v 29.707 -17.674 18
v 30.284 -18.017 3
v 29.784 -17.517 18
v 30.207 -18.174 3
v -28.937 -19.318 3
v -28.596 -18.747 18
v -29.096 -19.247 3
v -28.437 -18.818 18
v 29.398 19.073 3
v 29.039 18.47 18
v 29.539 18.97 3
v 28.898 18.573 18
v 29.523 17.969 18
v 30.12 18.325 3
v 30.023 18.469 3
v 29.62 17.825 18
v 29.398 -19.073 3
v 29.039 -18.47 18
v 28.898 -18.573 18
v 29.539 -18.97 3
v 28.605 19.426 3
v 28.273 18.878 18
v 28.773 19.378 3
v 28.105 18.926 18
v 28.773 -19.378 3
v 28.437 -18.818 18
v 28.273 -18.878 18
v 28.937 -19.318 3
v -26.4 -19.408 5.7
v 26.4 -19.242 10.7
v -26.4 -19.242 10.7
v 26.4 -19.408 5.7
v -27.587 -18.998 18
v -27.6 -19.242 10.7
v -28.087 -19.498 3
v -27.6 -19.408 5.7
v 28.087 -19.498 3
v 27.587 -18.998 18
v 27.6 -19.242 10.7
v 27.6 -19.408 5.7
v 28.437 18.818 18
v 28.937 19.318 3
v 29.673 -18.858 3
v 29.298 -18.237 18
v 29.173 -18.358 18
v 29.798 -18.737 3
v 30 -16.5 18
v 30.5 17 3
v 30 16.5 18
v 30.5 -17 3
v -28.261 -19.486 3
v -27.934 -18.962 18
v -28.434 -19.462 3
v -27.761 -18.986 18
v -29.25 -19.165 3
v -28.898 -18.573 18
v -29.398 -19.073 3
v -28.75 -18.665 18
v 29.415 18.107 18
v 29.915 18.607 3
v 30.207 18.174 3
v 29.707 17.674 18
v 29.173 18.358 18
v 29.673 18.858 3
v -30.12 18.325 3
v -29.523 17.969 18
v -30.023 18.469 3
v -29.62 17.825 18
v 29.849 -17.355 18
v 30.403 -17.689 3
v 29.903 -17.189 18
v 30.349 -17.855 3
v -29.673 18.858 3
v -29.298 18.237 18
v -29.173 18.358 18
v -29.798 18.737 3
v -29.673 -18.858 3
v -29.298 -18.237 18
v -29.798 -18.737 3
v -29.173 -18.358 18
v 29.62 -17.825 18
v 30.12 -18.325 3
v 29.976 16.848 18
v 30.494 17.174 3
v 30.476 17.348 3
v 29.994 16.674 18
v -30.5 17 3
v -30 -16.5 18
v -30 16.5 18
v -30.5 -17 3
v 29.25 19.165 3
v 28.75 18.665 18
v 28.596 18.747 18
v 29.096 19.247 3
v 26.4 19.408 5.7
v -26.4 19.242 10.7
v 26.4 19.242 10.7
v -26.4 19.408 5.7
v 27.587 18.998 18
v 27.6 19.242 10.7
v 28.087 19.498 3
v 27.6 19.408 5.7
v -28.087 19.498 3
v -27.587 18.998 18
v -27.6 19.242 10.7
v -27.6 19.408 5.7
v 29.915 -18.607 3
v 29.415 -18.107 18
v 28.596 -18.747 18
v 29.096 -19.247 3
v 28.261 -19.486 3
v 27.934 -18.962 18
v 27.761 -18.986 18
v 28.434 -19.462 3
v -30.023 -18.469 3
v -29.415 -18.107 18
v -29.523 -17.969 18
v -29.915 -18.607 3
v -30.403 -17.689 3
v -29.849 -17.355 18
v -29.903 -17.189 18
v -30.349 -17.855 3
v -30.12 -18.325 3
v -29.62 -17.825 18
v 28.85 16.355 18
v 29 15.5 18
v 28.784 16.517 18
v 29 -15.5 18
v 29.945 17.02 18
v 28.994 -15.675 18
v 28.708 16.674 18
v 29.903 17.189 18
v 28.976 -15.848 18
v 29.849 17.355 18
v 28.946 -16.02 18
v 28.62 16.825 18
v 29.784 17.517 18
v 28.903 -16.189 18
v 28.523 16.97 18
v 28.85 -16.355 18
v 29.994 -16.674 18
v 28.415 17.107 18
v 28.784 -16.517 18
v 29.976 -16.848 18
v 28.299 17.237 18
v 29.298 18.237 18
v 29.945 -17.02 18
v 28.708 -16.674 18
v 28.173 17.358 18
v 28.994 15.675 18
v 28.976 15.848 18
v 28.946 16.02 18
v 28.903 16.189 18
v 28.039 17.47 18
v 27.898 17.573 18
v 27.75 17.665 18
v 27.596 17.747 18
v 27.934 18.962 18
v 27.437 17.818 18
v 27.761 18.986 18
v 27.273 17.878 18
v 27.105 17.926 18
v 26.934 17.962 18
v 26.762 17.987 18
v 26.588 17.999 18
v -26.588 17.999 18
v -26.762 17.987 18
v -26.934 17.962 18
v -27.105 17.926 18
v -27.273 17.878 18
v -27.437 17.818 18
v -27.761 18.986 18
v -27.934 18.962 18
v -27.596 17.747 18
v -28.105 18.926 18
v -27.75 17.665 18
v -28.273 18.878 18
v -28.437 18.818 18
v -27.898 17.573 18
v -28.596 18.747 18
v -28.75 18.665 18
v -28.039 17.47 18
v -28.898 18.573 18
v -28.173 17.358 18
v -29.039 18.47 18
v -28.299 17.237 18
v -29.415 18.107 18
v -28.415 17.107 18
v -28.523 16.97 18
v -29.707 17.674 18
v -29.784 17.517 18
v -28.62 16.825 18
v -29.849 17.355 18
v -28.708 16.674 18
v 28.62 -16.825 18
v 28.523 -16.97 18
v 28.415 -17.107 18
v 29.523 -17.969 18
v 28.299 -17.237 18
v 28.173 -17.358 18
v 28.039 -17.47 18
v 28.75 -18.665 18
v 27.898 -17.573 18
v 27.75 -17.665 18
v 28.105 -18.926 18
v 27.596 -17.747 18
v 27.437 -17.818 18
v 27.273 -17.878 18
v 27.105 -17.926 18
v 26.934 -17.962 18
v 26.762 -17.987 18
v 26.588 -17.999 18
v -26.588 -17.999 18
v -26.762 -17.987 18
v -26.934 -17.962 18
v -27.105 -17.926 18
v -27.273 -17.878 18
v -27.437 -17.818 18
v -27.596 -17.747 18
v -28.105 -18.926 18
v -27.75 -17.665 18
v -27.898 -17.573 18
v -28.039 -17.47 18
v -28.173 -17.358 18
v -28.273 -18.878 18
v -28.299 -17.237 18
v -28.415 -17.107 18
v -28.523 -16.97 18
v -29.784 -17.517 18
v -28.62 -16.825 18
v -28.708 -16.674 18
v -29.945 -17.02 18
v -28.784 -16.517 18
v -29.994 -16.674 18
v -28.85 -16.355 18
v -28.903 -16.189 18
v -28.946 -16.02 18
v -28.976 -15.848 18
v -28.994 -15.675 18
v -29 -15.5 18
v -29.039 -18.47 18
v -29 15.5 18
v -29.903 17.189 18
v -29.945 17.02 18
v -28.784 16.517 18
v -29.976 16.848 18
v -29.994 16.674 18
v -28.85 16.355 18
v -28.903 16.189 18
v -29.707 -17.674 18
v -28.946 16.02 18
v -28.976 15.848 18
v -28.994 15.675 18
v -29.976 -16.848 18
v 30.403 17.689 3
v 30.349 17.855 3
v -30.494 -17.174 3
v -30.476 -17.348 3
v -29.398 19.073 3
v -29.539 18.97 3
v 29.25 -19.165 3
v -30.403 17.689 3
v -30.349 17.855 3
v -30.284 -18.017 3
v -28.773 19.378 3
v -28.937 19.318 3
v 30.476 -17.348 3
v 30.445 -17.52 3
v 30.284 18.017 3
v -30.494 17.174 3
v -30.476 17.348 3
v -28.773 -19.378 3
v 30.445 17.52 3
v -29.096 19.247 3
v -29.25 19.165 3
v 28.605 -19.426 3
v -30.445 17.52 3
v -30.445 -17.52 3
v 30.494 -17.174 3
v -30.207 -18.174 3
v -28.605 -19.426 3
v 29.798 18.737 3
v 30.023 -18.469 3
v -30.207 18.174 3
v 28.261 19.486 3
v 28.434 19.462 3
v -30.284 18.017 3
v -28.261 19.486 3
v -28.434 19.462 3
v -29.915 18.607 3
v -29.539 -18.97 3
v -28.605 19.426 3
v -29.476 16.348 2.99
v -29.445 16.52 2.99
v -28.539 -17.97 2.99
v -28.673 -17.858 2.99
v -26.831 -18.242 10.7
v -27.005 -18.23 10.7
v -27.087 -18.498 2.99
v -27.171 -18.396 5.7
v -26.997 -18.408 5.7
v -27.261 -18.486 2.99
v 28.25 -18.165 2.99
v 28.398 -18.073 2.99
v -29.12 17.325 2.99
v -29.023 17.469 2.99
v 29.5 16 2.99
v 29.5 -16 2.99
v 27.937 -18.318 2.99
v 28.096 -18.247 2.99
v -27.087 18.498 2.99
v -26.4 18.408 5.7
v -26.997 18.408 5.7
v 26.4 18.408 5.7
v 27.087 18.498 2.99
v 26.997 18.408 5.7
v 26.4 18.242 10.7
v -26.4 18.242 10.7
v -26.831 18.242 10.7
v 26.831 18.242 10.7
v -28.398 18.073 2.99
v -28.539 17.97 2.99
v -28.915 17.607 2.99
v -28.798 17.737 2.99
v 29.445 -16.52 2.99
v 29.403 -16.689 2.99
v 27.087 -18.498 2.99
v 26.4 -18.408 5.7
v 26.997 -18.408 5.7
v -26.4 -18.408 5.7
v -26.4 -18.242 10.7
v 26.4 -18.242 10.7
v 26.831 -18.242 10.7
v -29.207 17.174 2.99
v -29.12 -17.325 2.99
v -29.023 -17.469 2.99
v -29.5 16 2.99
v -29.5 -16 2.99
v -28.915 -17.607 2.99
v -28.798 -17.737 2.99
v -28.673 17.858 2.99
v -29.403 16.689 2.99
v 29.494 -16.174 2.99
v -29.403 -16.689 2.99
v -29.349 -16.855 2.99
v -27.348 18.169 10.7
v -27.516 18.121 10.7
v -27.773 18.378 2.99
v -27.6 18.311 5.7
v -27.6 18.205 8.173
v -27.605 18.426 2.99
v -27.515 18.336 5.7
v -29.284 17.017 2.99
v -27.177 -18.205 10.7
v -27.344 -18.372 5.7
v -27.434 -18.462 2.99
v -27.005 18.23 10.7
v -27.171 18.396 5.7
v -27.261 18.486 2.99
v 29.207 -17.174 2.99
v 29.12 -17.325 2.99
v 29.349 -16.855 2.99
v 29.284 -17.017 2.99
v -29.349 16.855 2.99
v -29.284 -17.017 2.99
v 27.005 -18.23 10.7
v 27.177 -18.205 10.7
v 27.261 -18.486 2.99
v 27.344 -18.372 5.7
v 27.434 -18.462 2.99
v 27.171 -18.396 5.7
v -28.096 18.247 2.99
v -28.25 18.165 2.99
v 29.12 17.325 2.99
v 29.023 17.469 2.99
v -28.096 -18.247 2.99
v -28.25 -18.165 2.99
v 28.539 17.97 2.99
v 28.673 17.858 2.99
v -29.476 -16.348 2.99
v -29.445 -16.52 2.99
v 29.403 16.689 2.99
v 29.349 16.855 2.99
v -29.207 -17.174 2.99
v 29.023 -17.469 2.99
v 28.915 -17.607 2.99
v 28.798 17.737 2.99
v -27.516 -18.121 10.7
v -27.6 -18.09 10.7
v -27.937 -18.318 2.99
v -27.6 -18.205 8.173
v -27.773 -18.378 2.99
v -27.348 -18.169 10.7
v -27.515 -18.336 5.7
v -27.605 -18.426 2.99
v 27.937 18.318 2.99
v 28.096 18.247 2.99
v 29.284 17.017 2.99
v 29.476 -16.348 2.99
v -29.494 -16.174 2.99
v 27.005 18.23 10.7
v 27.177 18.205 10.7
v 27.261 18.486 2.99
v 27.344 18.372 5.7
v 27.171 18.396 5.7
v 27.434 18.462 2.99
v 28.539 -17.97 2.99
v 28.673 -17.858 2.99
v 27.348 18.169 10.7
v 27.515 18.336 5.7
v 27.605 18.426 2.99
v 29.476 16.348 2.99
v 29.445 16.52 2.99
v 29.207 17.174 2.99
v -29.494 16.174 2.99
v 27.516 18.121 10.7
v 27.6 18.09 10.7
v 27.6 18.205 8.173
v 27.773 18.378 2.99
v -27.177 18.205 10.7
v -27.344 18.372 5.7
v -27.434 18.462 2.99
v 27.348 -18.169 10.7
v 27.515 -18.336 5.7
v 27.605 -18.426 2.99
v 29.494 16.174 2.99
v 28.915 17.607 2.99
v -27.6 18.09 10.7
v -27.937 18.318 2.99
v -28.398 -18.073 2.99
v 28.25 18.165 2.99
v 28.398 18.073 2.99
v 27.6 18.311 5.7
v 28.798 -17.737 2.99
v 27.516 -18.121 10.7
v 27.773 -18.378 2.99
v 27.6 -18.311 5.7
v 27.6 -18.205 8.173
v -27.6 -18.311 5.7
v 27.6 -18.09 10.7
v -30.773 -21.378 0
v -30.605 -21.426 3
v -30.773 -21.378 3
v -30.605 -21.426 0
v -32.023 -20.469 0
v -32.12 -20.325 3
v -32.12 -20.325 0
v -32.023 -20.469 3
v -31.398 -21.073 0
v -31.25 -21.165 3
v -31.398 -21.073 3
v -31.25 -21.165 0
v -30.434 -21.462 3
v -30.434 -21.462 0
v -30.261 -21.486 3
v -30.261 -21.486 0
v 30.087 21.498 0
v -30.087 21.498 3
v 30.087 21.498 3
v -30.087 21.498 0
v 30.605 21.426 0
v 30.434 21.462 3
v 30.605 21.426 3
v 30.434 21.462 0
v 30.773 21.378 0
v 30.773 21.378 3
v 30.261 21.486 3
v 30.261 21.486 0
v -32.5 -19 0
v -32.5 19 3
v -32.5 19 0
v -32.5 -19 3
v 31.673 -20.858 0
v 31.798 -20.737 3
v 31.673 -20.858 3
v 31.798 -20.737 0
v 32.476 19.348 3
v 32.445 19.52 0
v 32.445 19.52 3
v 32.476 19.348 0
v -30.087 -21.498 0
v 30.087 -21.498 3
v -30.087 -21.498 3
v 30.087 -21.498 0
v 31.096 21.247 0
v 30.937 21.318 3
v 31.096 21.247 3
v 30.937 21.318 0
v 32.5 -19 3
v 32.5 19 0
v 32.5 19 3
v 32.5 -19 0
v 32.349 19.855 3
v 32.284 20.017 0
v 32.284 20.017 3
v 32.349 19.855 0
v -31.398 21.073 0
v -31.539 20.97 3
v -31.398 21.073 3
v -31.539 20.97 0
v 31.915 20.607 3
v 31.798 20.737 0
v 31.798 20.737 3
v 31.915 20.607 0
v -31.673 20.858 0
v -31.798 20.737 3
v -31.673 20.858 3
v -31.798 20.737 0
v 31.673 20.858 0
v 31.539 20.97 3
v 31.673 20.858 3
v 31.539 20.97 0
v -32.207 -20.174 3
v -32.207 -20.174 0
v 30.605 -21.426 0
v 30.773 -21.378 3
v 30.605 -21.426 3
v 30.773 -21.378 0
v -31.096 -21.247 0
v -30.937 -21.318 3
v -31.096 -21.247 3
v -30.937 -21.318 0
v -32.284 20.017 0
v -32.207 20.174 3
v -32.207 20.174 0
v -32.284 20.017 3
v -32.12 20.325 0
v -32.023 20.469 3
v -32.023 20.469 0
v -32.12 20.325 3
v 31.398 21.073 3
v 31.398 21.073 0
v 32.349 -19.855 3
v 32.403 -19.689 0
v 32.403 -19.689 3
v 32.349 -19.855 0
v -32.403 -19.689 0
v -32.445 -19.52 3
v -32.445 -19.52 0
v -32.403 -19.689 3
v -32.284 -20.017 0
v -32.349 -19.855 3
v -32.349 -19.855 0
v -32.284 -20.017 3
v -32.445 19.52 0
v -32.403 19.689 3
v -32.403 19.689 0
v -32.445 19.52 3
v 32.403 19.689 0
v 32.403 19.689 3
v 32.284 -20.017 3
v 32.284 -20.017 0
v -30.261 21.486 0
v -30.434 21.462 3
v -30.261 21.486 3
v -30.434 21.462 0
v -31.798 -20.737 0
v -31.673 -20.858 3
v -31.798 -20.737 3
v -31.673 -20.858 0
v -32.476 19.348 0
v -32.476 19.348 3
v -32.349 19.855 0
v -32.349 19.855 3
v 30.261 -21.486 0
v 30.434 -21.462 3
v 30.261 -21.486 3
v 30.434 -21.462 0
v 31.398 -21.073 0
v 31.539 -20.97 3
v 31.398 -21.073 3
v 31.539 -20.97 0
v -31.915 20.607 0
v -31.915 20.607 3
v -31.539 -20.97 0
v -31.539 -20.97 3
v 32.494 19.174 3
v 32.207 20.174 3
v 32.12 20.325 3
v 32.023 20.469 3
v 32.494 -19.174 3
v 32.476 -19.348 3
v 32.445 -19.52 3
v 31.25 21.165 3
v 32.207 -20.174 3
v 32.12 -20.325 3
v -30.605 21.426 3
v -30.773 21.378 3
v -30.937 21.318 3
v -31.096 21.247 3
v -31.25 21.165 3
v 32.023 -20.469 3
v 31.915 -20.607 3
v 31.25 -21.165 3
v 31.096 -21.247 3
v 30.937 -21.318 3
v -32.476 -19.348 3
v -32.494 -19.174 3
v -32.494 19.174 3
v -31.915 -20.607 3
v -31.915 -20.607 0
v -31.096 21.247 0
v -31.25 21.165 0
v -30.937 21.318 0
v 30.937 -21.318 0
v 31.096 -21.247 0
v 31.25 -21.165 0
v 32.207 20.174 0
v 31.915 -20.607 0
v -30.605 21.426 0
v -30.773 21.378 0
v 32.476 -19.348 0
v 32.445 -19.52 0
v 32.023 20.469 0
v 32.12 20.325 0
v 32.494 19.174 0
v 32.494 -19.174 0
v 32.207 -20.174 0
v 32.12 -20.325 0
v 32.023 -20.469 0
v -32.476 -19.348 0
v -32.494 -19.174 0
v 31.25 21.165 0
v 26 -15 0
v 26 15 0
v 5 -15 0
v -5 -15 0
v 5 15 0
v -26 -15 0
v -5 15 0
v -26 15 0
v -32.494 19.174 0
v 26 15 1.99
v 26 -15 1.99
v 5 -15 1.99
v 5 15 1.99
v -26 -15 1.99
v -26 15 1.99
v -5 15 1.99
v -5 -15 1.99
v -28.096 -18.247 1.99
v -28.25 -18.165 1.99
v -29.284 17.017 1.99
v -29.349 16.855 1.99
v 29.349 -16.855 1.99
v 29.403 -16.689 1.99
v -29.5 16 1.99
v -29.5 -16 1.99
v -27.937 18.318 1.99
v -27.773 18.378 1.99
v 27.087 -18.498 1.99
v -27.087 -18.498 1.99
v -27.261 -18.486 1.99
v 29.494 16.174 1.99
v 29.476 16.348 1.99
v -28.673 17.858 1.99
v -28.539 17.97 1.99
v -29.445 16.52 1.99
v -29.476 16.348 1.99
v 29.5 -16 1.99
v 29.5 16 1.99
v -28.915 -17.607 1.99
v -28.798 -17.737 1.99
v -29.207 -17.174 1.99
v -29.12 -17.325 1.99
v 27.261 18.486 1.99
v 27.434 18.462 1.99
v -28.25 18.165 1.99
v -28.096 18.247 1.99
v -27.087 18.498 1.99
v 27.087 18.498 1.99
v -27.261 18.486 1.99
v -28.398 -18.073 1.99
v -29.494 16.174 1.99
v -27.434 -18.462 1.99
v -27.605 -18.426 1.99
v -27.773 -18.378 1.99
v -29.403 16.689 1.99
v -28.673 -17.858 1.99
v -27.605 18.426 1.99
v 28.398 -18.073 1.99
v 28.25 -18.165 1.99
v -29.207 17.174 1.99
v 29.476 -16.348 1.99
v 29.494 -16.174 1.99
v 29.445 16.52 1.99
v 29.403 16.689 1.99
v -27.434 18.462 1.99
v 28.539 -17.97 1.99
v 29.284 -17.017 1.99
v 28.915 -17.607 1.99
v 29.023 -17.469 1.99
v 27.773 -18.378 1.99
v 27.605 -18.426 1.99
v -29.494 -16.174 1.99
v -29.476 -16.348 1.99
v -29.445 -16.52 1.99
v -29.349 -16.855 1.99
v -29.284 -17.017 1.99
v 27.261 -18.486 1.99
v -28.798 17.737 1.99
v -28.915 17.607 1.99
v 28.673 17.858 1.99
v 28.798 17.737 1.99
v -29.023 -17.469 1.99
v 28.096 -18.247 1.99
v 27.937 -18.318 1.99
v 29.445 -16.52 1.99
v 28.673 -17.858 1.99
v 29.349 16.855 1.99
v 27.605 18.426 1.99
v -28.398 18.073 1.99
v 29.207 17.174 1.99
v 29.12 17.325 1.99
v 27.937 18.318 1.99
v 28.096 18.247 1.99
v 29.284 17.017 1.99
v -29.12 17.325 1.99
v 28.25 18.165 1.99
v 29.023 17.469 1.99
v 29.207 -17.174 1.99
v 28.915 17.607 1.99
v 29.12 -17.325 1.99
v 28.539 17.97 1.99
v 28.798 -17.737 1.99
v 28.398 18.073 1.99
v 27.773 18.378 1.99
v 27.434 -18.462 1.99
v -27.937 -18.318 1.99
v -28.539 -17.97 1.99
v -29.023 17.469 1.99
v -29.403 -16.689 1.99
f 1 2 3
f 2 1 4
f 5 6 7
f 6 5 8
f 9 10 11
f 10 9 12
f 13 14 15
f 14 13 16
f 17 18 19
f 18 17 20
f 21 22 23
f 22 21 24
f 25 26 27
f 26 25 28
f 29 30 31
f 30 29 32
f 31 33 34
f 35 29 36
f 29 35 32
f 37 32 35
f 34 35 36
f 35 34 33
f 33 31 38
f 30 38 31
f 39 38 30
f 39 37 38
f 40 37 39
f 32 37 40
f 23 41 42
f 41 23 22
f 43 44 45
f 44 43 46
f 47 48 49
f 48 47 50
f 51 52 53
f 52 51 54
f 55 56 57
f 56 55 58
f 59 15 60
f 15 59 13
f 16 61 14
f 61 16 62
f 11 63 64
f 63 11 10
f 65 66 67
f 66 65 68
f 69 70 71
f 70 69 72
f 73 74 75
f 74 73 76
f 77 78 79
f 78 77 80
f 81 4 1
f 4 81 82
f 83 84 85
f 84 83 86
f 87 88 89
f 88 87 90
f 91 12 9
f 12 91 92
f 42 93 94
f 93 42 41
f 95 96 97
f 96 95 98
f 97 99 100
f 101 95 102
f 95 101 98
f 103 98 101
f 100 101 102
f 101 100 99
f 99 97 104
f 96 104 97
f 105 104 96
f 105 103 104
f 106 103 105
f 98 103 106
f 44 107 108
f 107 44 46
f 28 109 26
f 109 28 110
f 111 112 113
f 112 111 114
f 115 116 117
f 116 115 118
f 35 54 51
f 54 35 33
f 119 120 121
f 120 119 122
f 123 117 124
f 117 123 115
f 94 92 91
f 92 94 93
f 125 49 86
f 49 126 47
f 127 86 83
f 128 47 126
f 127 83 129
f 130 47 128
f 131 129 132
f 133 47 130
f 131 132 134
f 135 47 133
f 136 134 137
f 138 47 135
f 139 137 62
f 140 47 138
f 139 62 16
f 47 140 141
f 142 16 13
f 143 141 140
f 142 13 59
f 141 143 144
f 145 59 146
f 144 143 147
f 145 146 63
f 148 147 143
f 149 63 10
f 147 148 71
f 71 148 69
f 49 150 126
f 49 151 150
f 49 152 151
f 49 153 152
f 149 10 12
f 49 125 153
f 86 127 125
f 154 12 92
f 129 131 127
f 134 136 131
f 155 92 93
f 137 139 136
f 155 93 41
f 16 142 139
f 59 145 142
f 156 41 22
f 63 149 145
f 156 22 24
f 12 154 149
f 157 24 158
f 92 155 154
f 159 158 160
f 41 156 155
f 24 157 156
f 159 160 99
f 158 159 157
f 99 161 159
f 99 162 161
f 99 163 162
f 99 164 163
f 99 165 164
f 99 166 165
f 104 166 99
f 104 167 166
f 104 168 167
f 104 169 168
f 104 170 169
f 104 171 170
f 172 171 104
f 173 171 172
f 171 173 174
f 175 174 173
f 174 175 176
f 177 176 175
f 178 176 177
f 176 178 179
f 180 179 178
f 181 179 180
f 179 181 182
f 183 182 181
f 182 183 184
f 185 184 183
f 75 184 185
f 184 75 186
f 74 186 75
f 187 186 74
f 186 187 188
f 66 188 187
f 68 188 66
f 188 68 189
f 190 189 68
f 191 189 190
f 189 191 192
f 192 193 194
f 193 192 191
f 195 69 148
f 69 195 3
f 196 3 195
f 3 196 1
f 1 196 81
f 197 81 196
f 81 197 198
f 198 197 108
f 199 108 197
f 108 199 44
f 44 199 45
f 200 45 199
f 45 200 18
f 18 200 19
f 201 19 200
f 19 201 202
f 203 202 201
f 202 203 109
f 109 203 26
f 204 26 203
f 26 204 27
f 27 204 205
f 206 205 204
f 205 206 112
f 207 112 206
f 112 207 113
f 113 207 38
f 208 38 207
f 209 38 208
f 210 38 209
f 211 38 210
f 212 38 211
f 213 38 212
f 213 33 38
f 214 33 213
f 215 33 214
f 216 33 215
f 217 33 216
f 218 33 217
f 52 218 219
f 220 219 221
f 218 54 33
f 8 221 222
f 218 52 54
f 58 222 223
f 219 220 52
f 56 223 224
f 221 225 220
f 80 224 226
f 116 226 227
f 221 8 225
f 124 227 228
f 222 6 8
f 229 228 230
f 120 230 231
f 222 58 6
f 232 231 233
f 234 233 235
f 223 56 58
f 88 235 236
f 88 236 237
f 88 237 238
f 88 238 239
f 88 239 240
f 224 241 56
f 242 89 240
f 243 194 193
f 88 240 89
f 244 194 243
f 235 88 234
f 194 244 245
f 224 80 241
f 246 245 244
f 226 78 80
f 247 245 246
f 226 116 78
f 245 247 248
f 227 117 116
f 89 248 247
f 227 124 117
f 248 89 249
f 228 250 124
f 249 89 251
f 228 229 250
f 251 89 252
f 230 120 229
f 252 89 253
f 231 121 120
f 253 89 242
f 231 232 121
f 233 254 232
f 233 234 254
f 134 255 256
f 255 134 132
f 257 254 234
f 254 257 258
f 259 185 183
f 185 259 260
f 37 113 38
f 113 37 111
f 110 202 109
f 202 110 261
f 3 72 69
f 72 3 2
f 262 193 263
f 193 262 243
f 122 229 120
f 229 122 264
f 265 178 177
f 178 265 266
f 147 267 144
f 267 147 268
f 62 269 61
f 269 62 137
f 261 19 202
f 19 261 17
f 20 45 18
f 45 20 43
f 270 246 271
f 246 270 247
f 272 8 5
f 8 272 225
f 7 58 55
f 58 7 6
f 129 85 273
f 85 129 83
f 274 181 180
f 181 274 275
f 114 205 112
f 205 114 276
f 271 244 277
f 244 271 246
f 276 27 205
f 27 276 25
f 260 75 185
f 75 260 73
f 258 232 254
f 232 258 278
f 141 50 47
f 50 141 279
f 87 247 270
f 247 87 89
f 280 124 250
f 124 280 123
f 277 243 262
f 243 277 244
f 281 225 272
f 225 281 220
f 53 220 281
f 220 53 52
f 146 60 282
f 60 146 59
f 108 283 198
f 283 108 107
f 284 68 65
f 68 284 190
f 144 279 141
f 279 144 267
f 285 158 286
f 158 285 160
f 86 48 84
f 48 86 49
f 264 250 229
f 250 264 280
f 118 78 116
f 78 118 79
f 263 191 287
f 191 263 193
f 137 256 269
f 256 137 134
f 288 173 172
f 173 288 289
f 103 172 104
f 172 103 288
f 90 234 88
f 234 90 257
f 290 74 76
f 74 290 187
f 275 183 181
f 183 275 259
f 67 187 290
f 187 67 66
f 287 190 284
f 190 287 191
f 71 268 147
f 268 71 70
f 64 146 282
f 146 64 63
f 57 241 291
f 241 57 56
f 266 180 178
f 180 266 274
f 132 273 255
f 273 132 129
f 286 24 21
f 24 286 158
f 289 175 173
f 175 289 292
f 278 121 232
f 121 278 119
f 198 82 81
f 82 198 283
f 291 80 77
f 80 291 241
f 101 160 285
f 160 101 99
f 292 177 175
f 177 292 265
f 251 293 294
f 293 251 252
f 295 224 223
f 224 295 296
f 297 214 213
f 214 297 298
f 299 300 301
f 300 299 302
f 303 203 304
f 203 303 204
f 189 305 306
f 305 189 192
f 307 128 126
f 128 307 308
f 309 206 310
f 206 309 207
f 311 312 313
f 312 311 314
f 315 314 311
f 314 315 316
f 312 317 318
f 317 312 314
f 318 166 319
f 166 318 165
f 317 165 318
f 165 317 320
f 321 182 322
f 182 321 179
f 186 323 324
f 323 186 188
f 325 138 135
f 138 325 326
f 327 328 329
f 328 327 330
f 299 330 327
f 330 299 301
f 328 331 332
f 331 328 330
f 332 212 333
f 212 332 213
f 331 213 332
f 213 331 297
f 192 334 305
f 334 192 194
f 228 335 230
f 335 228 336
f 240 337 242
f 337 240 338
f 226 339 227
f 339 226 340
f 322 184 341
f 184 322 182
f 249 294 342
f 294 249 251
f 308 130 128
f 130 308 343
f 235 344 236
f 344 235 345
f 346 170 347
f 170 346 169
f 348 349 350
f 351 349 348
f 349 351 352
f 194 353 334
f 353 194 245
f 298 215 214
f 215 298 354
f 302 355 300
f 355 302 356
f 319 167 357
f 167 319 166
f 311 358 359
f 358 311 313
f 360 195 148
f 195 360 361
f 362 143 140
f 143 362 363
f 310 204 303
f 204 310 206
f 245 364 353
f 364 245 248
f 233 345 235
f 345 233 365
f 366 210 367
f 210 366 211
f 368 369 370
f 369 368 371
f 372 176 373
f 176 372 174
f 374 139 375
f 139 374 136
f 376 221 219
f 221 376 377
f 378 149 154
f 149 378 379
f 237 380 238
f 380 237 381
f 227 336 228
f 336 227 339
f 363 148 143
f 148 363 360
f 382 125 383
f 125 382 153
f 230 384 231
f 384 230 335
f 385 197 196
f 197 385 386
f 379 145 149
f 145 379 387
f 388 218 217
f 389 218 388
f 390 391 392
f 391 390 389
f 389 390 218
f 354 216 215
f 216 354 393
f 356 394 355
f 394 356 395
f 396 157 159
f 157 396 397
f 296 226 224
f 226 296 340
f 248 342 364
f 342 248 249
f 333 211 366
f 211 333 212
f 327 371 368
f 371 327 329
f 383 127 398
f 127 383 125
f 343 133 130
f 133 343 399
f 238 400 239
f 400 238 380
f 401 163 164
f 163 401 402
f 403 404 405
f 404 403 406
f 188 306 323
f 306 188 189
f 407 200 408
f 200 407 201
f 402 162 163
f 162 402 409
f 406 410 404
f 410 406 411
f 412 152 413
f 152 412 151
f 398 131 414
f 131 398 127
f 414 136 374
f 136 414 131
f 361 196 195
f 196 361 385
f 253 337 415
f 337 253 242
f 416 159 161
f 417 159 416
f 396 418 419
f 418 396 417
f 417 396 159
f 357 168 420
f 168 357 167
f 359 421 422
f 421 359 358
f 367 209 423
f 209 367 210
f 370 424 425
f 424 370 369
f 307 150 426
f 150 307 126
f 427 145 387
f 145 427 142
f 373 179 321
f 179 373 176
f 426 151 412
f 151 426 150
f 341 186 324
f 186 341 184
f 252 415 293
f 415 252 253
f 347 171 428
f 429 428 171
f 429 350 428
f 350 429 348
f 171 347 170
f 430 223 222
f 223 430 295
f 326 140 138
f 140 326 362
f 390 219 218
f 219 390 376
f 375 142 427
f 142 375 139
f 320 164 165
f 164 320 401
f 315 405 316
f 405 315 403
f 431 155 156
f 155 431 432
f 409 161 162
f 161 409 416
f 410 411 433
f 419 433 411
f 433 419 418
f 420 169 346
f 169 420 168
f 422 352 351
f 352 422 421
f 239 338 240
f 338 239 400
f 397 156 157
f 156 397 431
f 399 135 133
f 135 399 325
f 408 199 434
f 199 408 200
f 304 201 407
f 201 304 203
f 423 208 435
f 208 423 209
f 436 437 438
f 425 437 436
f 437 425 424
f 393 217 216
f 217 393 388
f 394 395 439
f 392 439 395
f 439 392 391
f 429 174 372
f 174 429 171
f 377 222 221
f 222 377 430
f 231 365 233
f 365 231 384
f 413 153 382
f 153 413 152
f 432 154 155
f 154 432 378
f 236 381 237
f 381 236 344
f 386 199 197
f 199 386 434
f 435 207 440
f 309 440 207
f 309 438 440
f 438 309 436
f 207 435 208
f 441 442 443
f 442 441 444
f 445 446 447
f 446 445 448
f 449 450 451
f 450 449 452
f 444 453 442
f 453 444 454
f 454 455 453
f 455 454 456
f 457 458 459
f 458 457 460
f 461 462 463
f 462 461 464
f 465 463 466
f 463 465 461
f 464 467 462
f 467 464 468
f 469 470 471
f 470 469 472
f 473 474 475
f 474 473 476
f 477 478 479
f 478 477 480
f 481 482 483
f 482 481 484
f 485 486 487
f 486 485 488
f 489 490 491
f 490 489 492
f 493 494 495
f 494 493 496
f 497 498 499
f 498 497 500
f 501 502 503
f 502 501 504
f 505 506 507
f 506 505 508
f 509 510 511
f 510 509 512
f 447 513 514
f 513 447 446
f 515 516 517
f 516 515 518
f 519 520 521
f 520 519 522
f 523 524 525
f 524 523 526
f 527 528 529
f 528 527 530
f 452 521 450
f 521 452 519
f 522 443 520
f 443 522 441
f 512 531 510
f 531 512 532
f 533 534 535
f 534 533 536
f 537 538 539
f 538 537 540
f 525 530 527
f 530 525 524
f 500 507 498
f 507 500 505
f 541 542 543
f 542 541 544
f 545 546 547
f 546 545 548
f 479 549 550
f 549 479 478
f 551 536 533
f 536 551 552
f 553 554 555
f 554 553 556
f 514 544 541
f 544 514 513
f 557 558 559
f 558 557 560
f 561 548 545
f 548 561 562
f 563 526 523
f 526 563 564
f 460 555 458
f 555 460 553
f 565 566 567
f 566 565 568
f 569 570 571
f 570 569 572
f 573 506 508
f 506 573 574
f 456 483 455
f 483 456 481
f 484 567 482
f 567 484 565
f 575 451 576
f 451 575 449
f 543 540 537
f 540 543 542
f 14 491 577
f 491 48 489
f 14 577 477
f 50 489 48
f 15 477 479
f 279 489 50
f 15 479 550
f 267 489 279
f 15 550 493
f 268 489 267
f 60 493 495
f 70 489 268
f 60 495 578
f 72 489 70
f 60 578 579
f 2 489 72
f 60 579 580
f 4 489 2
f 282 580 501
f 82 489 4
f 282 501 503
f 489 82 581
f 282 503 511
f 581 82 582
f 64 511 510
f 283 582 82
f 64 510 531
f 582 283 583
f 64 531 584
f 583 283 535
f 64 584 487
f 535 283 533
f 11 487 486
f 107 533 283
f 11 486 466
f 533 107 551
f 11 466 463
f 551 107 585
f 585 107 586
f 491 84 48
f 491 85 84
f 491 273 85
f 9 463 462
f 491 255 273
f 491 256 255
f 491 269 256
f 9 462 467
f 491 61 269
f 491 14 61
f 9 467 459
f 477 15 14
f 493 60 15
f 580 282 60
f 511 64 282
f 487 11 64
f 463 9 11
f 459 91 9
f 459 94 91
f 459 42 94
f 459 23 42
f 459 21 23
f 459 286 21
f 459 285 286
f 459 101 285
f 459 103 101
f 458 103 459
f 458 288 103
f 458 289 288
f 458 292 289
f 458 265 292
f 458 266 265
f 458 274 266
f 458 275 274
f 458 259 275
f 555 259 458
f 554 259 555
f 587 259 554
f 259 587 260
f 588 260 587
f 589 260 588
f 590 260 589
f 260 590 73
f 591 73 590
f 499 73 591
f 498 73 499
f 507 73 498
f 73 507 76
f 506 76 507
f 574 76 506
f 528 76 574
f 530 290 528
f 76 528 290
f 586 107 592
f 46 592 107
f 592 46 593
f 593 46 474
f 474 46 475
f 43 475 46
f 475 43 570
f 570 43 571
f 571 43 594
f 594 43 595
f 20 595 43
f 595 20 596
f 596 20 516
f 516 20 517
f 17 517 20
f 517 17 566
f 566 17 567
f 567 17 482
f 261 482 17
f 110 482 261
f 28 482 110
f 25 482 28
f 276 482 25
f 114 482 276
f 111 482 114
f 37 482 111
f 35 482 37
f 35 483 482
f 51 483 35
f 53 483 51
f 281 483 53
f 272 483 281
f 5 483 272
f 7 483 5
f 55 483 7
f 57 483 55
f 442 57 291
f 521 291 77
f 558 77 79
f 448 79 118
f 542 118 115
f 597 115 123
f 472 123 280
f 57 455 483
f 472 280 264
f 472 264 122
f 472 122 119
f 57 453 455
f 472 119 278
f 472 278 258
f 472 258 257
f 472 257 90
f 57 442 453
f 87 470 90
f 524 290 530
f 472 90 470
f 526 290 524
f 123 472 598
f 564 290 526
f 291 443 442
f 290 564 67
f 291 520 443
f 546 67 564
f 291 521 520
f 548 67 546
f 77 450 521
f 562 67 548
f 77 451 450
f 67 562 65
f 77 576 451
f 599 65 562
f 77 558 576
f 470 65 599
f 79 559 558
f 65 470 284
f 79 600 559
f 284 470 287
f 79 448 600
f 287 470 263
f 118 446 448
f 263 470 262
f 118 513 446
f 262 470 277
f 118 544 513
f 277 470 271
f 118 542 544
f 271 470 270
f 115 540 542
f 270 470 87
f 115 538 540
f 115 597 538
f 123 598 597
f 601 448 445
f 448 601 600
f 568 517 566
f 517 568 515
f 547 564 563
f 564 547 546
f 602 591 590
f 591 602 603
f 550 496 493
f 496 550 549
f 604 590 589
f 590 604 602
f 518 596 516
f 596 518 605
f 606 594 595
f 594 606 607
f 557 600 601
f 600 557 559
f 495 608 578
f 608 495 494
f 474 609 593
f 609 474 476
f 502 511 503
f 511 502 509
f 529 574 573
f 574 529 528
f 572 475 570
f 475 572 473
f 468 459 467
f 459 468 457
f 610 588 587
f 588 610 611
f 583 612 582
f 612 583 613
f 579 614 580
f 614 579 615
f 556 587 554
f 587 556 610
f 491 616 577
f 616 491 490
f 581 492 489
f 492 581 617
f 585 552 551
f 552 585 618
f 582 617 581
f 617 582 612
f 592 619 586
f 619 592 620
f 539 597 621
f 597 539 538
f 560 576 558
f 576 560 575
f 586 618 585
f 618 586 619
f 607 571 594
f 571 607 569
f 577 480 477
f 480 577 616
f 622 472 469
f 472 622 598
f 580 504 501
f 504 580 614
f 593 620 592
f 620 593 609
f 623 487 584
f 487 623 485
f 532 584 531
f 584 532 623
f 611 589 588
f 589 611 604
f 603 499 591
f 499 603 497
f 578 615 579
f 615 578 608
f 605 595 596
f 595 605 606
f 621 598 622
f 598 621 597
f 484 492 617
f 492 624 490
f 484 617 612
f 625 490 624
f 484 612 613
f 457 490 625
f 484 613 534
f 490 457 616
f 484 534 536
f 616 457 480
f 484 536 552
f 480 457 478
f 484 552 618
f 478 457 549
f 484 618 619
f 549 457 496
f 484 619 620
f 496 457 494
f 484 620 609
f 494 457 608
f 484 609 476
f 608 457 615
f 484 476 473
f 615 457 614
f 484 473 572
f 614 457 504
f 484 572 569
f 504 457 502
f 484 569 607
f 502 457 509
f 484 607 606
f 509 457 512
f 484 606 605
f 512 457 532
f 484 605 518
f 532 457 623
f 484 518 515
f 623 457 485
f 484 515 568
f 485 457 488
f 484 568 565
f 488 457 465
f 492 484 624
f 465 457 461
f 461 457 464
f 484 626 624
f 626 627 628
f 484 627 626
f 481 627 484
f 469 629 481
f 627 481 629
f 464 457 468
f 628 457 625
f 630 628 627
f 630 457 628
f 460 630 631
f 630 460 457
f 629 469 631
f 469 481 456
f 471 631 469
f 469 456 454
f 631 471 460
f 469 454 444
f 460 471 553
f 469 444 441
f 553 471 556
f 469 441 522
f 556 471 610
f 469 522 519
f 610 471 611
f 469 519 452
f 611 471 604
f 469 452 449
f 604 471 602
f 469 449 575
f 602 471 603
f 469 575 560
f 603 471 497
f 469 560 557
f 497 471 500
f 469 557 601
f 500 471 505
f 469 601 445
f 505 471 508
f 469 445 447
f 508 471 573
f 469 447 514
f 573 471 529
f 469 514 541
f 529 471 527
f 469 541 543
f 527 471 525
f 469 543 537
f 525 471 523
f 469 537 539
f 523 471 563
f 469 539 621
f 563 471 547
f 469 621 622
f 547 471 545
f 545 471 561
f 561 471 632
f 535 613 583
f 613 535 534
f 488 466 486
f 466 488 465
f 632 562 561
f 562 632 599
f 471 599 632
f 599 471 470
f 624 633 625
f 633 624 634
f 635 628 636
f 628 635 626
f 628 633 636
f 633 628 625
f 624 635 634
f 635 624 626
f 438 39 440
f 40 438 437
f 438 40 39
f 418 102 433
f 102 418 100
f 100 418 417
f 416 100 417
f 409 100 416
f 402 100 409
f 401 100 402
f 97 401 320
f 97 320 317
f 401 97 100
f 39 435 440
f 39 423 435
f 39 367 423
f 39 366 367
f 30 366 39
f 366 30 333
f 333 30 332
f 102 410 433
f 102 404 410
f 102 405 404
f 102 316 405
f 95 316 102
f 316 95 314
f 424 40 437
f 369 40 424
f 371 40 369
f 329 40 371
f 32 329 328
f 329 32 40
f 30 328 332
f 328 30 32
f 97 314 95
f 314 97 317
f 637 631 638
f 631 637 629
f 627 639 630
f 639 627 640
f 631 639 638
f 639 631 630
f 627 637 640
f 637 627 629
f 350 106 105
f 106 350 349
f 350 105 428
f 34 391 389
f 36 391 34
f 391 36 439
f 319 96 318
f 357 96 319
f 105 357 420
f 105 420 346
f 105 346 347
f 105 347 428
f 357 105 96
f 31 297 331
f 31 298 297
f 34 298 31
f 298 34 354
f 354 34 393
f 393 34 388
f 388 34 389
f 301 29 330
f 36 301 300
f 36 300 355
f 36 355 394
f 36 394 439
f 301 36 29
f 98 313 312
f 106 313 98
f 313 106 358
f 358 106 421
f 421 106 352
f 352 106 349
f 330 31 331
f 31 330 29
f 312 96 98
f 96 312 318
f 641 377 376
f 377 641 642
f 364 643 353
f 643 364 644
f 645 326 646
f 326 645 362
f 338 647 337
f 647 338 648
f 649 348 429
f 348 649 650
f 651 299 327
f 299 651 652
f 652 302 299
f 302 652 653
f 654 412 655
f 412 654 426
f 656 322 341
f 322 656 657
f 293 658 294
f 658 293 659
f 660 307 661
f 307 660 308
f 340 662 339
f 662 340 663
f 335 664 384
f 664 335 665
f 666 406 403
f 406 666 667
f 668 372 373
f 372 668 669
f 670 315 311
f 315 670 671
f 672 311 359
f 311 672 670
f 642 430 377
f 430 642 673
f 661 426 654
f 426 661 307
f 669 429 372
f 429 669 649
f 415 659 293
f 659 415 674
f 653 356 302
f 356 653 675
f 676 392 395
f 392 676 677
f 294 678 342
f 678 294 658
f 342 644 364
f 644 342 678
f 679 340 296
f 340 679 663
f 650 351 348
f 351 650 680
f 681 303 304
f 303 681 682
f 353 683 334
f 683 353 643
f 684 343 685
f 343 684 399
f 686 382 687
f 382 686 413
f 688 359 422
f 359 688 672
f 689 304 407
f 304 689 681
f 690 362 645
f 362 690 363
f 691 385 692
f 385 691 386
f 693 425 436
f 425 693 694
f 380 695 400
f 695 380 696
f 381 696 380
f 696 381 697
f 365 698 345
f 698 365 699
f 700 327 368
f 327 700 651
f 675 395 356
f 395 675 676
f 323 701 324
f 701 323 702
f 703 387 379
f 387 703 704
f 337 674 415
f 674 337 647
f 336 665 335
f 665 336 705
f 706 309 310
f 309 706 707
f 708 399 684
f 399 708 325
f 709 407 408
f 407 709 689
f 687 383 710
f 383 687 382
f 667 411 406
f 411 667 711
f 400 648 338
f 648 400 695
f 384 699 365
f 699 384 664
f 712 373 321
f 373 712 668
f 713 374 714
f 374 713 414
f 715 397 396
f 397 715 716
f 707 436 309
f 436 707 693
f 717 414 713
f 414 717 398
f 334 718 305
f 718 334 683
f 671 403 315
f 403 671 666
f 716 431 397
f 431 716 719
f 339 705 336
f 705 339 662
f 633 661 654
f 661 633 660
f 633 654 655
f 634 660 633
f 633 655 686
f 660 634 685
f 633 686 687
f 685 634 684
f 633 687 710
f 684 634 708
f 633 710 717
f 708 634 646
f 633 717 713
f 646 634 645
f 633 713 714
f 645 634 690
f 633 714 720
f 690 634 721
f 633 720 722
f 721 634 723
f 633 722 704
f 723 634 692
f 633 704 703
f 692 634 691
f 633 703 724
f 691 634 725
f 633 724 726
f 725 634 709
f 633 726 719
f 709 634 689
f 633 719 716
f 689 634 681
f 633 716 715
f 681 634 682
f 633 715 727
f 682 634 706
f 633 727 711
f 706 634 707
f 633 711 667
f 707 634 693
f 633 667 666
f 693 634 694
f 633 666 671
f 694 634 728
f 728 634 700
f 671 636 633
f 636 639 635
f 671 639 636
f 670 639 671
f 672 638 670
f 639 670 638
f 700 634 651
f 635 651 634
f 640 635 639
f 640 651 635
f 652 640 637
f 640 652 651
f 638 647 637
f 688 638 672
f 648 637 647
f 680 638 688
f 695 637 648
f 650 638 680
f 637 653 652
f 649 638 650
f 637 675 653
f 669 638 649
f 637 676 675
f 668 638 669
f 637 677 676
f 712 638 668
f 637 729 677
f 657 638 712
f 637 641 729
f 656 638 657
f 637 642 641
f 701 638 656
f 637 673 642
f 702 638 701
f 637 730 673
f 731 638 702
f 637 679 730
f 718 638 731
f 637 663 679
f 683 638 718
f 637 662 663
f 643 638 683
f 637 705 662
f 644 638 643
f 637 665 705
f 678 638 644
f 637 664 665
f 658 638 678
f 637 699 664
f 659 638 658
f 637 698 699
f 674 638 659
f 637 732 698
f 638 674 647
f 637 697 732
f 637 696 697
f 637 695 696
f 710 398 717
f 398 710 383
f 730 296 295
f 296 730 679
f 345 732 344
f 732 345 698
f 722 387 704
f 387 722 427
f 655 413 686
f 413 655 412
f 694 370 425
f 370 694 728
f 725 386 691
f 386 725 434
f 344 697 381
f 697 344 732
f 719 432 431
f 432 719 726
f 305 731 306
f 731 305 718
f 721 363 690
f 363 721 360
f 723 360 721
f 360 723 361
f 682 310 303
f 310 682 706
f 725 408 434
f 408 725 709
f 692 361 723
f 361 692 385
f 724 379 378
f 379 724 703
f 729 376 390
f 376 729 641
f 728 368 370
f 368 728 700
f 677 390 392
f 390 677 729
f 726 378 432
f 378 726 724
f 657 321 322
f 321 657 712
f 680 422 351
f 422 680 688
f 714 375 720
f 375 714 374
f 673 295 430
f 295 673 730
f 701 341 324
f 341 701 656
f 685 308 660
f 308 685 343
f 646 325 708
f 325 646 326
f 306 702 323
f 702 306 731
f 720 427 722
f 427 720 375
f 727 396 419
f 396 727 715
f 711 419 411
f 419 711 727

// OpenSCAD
// To put in different switches that fits into a gaggia classic.

$fn=90;
e=0.01;

top_width=65;
top_height=43;
top_thick=3;
front_wall=2;
switch_offset=5;

module zip_tie() {
  translate([-1.2/2, -60/2, top_thick+2.7]) cube([1.2, 60, 5]);
}

module switch_block() {
  h=30;
  w=21;
  translate([0, -h/2, -e]) cube([w, h, 20]);
  translate([w+1, 0, 0]) zip_tie();
}

module rounded_rectangle(w=40, h=20,r=2.5,thick=1) {
    hull() {
      translate([-w/2+r, -h/2+r, 0]) cylinder(r=r,h=thick);
      translate([+w/2-r, -h/2+r, 0]) cylinder(r=r,h=thick);
      translate([+w/2-r, +h/2-r, 0]) cylinder(r=r,h=thick);
      translate([-w/2+r, +h/2-r, 0]) cylinder(r=r,h=thick);
    }
}

module hollow_box(from_outer=4, draft=1, wall=2, height=15, punch=false) {
  if (punch) {
    hull() {
      translate([0, 0, -e]) rounded_rectangle(w=top_width-from_outer-wall, h=top_height-from_outer-wall, thick=1);
      translate([0, 0, height+e]) rounded_rectangle(w=top_width-from_outer-wall-draft, h=top_height-from_outer-wall-draft, thick=1);
    }
  }
  else {
    difference() {
      hull() {
	rounded_rectangle(w=top_width-from_outer, h=top_height-from_outer, thick=1);
	translate([0, 0, height]) rounded_rectangle(w=top_width-from_outer-draft, h=top_height-from_outer-draft, thick=1);
      }

      hollow_box(from_outer, draft, wall, height, true);
    }
  }
}

difference() {
  hollow_offset=2;
  union() {
    rounded_rectangle(w=top_width, h=top_height, thick=top_thick);
    translate([0, 0, hollow_offset]) hollow_box();
  }

  translate([0, 0, hollow_offset]) hollow_box(punch=true);
  translate([switch_offset, 0, 0]) switch_block();
  scale([-1, 1, 1]) translate([switch_offset, 0, 0]) switch_block();
}
